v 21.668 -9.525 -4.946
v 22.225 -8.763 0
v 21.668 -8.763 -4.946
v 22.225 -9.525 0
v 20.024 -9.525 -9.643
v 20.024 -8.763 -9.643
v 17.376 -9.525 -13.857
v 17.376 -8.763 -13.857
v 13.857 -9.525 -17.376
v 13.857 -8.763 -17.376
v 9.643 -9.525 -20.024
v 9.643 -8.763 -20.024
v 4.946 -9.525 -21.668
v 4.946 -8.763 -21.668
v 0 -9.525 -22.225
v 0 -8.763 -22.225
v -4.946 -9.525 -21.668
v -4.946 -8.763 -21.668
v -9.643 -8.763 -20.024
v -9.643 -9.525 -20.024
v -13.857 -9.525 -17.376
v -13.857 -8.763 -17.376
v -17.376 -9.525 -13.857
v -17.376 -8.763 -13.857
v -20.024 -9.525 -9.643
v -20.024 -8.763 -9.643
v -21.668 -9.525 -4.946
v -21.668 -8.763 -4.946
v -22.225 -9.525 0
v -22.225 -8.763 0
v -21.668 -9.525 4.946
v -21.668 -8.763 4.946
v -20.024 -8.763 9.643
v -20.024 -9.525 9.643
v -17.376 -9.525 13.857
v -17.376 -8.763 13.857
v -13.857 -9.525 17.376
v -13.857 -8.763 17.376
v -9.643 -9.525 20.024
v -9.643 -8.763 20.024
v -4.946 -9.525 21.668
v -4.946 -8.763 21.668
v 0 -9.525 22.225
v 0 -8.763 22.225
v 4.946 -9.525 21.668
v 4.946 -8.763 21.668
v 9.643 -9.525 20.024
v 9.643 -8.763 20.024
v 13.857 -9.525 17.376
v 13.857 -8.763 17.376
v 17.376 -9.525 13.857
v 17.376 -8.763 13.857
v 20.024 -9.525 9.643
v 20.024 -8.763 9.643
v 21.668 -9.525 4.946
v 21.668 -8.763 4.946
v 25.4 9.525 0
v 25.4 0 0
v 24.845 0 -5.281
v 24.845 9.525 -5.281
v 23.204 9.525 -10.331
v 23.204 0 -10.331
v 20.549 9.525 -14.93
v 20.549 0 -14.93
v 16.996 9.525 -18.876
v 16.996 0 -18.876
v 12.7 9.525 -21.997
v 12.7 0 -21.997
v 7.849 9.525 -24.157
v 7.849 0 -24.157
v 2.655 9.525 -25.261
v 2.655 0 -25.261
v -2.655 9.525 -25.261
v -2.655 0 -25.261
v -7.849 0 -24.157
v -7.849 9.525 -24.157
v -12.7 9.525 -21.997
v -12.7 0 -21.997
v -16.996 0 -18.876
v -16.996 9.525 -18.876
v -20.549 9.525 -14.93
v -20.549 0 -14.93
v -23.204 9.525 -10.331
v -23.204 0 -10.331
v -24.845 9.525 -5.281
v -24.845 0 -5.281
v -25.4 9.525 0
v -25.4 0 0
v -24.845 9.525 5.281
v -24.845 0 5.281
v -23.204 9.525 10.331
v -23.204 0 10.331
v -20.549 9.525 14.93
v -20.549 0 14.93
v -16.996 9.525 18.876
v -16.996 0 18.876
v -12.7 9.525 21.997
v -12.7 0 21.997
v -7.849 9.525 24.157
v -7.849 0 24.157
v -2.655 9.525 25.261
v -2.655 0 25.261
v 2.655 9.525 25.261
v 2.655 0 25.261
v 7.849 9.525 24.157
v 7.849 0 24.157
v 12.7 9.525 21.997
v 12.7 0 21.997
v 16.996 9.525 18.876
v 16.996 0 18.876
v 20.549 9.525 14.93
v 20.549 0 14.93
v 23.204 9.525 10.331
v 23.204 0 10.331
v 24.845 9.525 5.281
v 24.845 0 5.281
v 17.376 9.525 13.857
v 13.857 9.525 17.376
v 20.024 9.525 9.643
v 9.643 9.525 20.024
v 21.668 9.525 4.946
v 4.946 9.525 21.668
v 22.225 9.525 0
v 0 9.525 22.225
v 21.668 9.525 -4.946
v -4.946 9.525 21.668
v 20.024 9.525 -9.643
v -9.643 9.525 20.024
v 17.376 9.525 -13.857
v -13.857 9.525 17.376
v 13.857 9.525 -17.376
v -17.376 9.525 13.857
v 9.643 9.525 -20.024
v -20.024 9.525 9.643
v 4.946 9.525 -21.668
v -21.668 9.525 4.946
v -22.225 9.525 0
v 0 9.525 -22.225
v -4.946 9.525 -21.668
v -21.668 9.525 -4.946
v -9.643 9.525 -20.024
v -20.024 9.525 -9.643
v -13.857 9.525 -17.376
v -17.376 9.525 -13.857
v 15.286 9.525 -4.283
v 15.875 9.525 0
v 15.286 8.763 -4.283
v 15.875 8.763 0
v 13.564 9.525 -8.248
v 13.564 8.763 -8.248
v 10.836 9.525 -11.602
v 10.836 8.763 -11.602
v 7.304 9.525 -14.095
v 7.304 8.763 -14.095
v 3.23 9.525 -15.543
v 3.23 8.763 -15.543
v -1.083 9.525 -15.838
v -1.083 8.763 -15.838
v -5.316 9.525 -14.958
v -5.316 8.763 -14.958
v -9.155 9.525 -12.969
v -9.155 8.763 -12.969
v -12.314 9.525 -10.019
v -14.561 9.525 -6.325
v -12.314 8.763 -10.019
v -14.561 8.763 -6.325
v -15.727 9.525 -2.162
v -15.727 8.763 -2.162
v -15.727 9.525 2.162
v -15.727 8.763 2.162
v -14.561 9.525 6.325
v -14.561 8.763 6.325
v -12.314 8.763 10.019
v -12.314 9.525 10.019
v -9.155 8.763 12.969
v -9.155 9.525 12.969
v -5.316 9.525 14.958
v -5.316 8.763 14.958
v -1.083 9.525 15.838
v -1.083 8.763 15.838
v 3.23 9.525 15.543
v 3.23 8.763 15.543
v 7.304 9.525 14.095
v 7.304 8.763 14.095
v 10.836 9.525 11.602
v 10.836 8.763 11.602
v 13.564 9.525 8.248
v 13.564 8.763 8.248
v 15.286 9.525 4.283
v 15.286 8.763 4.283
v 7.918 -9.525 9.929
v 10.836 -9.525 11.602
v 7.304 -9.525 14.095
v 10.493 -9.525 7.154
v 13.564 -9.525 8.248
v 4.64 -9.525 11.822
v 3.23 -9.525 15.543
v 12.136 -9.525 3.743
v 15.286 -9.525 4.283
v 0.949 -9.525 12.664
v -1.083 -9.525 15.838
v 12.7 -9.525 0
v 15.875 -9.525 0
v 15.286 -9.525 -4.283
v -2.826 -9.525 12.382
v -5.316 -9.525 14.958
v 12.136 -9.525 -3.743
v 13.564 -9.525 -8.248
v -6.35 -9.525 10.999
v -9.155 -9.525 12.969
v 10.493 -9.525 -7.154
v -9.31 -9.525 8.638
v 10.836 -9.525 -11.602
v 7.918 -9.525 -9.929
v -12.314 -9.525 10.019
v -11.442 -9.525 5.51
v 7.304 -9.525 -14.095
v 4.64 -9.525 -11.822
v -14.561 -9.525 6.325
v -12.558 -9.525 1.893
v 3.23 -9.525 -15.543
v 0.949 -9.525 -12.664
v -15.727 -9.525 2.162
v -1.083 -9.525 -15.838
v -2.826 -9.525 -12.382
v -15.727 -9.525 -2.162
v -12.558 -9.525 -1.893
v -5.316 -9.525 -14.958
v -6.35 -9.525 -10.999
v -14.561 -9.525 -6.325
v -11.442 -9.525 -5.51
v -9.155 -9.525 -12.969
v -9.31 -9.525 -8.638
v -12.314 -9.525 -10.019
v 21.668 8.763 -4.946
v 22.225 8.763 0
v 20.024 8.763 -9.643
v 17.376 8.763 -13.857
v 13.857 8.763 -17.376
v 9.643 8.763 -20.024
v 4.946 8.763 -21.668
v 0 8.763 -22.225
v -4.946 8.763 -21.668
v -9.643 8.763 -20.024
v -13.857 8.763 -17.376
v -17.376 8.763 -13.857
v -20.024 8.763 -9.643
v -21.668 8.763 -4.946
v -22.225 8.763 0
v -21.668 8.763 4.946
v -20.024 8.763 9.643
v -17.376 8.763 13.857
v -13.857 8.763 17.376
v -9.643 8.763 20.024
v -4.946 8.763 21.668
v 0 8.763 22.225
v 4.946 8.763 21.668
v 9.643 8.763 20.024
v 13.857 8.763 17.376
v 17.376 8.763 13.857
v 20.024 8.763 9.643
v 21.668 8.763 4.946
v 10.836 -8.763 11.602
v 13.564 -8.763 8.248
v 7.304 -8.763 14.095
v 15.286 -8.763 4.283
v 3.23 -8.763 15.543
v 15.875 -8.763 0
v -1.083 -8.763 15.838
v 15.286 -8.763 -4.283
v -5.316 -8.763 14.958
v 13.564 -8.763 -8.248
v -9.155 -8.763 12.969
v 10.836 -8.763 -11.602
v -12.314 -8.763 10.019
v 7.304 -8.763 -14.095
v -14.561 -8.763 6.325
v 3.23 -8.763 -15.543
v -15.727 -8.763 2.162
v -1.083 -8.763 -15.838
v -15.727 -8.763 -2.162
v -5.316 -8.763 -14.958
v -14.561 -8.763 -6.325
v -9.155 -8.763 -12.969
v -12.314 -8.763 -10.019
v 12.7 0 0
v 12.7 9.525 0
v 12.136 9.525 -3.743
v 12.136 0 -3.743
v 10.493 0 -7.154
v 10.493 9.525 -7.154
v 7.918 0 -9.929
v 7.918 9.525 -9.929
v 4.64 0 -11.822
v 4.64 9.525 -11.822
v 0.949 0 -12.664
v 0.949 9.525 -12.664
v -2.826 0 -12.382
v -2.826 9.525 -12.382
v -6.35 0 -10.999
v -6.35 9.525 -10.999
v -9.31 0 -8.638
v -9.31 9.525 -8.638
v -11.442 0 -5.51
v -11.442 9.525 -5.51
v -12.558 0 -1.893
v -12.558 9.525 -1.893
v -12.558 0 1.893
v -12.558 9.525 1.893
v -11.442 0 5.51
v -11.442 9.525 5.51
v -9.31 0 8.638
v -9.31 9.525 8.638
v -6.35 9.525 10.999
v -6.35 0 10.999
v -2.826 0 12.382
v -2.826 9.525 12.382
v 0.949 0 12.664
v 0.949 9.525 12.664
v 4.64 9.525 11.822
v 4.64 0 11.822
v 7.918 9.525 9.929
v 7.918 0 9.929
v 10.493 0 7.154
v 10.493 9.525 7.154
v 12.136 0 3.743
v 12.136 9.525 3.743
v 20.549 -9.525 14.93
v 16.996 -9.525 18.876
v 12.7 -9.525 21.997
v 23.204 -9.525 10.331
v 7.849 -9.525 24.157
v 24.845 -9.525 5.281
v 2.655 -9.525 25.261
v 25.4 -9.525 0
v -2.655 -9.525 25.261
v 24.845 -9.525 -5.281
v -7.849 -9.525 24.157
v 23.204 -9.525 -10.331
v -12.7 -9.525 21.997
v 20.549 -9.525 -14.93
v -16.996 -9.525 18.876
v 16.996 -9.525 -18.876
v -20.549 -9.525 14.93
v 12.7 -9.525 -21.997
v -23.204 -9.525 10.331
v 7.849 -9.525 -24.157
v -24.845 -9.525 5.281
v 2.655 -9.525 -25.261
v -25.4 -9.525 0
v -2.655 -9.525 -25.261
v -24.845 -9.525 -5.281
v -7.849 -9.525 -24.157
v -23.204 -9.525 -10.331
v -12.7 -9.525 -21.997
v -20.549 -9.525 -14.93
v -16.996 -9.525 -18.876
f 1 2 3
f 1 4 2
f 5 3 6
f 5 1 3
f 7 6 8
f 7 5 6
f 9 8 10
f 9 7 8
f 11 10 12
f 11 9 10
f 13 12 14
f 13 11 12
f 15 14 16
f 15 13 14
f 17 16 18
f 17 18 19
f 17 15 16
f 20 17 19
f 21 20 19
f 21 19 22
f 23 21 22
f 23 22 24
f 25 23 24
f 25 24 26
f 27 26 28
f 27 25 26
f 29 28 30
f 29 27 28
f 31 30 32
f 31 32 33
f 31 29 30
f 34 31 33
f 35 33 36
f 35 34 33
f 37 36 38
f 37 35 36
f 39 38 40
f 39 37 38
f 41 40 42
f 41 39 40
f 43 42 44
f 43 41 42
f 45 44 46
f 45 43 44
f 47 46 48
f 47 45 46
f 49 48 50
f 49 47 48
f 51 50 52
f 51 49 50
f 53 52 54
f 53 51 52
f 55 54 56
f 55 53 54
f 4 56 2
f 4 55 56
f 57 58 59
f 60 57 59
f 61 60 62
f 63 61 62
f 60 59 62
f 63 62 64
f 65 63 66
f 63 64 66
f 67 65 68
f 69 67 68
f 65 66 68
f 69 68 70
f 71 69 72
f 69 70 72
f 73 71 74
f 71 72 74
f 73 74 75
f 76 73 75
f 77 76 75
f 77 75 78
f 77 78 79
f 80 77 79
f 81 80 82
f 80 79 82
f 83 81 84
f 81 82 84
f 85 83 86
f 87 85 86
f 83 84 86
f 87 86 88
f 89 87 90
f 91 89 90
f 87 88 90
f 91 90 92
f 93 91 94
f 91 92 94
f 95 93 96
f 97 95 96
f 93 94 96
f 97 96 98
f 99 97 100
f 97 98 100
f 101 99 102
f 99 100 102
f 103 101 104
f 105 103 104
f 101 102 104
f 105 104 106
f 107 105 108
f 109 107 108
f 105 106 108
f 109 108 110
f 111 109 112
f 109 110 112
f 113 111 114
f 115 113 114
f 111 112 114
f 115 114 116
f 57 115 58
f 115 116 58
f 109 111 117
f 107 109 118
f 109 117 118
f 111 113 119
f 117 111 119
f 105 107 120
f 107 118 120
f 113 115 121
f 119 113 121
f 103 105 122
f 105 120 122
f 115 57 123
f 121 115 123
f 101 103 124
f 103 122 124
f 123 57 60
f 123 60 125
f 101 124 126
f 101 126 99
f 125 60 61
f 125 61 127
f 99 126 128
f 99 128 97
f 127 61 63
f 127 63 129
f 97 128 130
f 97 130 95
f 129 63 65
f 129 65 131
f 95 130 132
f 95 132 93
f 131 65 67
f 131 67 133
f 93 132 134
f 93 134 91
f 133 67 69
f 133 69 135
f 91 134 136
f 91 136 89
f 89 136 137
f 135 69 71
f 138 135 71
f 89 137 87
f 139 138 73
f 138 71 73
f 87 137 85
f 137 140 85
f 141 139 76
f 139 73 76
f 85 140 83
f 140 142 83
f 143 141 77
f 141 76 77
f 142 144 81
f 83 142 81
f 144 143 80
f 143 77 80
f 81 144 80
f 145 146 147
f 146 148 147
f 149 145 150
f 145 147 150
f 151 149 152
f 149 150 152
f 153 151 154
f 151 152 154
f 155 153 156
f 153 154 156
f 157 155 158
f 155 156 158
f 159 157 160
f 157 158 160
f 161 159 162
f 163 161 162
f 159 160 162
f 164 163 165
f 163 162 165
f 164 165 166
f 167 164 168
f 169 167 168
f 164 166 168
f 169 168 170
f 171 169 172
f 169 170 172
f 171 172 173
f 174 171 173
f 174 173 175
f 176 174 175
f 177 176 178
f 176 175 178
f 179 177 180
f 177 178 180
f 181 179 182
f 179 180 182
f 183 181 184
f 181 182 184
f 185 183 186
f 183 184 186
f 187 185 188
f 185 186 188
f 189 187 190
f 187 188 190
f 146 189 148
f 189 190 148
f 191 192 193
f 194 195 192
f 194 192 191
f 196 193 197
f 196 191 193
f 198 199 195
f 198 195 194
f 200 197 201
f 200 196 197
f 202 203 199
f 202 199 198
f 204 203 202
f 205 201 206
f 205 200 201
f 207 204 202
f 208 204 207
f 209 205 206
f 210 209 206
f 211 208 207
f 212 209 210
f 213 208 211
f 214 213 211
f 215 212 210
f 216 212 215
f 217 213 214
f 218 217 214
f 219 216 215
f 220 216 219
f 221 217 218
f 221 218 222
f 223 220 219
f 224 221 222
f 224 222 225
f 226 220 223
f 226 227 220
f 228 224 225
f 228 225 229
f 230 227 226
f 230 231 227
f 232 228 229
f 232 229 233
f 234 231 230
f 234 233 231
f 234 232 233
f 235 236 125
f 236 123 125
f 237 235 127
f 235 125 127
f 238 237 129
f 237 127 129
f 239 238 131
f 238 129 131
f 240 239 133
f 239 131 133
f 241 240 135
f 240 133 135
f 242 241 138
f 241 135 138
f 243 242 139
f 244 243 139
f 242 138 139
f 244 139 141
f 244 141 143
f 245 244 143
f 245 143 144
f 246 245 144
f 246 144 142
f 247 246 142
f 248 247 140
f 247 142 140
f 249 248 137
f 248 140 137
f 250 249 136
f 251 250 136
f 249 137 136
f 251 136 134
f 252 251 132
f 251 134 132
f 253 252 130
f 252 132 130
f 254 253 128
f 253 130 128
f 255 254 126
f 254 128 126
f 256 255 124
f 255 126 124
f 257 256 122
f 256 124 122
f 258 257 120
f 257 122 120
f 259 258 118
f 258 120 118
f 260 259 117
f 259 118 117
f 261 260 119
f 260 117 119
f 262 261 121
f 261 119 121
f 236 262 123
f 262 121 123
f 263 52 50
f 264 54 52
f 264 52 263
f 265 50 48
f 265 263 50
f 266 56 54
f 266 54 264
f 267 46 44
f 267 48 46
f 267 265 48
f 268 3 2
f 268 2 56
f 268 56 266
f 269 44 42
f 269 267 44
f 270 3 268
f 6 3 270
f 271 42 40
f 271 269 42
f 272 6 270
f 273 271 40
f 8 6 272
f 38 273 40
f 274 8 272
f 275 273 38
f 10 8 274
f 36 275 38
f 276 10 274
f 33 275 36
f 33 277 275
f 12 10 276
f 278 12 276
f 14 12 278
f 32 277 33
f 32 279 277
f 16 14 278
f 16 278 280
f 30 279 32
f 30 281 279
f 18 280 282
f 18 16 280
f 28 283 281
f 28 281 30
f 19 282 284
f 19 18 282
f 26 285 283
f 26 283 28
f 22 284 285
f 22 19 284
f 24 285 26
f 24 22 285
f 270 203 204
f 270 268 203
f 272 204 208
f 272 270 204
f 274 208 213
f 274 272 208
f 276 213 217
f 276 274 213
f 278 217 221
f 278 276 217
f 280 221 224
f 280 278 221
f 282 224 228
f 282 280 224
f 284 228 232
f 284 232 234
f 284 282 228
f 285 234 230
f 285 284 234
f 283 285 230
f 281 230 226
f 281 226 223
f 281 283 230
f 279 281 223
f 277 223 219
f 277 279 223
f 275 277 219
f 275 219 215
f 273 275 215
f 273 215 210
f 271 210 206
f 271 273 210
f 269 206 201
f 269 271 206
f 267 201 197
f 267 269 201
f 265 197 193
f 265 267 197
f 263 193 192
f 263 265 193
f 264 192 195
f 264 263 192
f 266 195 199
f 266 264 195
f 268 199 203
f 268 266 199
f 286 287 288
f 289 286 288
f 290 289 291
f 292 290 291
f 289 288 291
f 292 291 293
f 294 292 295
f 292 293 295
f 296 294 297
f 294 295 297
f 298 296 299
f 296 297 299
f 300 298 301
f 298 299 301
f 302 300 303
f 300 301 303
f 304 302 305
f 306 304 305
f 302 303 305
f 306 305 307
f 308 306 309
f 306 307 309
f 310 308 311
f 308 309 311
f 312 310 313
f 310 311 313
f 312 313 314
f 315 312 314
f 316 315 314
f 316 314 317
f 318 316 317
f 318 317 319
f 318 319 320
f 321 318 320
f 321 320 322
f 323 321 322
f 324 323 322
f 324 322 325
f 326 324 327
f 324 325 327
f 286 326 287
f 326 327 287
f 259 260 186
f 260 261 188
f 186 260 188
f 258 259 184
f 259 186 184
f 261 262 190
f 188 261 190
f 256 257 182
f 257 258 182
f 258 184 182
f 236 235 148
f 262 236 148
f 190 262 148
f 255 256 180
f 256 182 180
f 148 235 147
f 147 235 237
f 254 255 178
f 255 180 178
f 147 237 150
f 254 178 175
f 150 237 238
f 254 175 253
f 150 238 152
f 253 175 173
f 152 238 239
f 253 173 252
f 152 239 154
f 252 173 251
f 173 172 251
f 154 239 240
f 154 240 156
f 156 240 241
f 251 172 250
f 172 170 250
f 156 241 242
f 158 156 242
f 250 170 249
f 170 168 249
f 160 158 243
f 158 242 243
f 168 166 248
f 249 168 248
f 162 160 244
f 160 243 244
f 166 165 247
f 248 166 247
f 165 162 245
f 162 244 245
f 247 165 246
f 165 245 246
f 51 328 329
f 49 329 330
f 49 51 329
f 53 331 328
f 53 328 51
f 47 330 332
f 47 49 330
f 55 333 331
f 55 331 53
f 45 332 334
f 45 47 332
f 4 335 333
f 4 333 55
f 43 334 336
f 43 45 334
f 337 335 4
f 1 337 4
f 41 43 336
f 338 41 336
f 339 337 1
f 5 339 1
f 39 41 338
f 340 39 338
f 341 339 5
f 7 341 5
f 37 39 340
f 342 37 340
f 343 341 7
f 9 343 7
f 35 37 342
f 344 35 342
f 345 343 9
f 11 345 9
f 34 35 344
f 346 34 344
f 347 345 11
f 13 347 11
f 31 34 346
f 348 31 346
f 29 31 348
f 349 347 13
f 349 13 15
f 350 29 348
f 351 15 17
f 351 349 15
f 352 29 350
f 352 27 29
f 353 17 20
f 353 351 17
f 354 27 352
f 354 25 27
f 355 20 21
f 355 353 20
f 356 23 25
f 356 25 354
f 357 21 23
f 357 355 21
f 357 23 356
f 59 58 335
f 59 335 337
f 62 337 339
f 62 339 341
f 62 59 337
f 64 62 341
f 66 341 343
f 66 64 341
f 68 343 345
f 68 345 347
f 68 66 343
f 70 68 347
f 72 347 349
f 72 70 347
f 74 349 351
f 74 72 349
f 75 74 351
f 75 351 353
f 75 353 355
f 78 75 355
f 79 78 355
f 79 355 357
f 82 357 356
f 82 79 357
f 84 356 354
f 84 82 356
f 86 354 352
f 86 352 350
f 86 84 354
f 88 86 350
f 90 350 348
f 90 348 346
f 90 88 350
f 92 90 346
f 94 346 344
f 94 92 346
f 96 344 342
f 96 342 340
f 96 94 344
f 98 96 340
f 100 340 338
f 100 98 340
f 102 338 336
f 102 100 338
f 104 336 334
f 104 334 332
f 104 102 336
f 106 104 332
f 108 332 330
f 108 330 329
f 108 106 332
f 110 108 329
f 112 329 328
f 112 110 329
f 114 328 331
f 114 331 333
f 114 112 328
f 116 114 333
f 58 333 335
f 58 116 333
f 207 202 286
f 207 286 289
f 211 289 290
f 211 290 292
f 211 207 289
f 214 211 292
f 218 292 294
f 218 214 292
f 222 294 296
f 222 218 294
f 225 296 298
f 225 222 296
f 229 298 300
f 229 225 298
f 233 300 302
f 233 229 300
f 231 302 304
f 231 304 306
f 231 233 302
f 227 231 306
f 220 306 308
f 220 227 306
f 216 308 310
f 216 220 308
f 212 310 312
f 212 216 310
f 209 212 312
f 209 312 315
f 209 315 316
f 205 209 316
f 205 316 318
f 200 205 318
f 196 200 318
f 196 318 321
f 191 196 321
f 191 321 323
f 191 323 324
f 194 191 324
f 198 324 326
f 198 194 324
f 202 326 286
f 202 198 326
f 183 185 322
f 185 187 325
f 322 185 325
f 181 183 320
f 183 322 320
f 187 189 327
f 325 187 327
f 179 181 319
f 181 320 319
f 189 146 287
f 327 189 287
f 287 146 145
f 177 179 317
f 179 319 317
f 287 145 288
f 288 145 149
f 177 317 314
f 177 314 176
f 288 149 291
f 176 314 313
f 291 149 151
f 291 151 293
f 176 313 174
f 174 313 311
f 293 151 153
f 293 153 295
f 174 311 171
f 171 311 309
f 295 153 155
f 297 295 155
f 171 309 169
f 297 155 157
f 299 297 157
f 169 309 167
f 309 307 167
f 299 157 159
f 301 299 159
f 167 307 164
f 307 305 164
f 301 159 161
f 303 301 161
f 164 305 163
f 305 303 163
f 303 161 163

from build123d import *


with BuildPart() as part:
    # Sketch1 → Revolve1 (revolve)
    with BuildSketch(Plane.XY):
        Polygon((12.7, 9.525), (15.875, 9.525), (15.875, 8.763), (22.225, 8.763), (22.225, 9.525), (25.4, 9.525), (25.4, 0), (12.7, 0), align=None)
    revolve(axis=Axis((0, 0, 0), (0, 1, 0)))

    # Mirror1: part across plane


with BuildPart() as part_1:
    add(part.part)
    add(part.part.mirror(Plane.ZX))


solid = part_1.part
